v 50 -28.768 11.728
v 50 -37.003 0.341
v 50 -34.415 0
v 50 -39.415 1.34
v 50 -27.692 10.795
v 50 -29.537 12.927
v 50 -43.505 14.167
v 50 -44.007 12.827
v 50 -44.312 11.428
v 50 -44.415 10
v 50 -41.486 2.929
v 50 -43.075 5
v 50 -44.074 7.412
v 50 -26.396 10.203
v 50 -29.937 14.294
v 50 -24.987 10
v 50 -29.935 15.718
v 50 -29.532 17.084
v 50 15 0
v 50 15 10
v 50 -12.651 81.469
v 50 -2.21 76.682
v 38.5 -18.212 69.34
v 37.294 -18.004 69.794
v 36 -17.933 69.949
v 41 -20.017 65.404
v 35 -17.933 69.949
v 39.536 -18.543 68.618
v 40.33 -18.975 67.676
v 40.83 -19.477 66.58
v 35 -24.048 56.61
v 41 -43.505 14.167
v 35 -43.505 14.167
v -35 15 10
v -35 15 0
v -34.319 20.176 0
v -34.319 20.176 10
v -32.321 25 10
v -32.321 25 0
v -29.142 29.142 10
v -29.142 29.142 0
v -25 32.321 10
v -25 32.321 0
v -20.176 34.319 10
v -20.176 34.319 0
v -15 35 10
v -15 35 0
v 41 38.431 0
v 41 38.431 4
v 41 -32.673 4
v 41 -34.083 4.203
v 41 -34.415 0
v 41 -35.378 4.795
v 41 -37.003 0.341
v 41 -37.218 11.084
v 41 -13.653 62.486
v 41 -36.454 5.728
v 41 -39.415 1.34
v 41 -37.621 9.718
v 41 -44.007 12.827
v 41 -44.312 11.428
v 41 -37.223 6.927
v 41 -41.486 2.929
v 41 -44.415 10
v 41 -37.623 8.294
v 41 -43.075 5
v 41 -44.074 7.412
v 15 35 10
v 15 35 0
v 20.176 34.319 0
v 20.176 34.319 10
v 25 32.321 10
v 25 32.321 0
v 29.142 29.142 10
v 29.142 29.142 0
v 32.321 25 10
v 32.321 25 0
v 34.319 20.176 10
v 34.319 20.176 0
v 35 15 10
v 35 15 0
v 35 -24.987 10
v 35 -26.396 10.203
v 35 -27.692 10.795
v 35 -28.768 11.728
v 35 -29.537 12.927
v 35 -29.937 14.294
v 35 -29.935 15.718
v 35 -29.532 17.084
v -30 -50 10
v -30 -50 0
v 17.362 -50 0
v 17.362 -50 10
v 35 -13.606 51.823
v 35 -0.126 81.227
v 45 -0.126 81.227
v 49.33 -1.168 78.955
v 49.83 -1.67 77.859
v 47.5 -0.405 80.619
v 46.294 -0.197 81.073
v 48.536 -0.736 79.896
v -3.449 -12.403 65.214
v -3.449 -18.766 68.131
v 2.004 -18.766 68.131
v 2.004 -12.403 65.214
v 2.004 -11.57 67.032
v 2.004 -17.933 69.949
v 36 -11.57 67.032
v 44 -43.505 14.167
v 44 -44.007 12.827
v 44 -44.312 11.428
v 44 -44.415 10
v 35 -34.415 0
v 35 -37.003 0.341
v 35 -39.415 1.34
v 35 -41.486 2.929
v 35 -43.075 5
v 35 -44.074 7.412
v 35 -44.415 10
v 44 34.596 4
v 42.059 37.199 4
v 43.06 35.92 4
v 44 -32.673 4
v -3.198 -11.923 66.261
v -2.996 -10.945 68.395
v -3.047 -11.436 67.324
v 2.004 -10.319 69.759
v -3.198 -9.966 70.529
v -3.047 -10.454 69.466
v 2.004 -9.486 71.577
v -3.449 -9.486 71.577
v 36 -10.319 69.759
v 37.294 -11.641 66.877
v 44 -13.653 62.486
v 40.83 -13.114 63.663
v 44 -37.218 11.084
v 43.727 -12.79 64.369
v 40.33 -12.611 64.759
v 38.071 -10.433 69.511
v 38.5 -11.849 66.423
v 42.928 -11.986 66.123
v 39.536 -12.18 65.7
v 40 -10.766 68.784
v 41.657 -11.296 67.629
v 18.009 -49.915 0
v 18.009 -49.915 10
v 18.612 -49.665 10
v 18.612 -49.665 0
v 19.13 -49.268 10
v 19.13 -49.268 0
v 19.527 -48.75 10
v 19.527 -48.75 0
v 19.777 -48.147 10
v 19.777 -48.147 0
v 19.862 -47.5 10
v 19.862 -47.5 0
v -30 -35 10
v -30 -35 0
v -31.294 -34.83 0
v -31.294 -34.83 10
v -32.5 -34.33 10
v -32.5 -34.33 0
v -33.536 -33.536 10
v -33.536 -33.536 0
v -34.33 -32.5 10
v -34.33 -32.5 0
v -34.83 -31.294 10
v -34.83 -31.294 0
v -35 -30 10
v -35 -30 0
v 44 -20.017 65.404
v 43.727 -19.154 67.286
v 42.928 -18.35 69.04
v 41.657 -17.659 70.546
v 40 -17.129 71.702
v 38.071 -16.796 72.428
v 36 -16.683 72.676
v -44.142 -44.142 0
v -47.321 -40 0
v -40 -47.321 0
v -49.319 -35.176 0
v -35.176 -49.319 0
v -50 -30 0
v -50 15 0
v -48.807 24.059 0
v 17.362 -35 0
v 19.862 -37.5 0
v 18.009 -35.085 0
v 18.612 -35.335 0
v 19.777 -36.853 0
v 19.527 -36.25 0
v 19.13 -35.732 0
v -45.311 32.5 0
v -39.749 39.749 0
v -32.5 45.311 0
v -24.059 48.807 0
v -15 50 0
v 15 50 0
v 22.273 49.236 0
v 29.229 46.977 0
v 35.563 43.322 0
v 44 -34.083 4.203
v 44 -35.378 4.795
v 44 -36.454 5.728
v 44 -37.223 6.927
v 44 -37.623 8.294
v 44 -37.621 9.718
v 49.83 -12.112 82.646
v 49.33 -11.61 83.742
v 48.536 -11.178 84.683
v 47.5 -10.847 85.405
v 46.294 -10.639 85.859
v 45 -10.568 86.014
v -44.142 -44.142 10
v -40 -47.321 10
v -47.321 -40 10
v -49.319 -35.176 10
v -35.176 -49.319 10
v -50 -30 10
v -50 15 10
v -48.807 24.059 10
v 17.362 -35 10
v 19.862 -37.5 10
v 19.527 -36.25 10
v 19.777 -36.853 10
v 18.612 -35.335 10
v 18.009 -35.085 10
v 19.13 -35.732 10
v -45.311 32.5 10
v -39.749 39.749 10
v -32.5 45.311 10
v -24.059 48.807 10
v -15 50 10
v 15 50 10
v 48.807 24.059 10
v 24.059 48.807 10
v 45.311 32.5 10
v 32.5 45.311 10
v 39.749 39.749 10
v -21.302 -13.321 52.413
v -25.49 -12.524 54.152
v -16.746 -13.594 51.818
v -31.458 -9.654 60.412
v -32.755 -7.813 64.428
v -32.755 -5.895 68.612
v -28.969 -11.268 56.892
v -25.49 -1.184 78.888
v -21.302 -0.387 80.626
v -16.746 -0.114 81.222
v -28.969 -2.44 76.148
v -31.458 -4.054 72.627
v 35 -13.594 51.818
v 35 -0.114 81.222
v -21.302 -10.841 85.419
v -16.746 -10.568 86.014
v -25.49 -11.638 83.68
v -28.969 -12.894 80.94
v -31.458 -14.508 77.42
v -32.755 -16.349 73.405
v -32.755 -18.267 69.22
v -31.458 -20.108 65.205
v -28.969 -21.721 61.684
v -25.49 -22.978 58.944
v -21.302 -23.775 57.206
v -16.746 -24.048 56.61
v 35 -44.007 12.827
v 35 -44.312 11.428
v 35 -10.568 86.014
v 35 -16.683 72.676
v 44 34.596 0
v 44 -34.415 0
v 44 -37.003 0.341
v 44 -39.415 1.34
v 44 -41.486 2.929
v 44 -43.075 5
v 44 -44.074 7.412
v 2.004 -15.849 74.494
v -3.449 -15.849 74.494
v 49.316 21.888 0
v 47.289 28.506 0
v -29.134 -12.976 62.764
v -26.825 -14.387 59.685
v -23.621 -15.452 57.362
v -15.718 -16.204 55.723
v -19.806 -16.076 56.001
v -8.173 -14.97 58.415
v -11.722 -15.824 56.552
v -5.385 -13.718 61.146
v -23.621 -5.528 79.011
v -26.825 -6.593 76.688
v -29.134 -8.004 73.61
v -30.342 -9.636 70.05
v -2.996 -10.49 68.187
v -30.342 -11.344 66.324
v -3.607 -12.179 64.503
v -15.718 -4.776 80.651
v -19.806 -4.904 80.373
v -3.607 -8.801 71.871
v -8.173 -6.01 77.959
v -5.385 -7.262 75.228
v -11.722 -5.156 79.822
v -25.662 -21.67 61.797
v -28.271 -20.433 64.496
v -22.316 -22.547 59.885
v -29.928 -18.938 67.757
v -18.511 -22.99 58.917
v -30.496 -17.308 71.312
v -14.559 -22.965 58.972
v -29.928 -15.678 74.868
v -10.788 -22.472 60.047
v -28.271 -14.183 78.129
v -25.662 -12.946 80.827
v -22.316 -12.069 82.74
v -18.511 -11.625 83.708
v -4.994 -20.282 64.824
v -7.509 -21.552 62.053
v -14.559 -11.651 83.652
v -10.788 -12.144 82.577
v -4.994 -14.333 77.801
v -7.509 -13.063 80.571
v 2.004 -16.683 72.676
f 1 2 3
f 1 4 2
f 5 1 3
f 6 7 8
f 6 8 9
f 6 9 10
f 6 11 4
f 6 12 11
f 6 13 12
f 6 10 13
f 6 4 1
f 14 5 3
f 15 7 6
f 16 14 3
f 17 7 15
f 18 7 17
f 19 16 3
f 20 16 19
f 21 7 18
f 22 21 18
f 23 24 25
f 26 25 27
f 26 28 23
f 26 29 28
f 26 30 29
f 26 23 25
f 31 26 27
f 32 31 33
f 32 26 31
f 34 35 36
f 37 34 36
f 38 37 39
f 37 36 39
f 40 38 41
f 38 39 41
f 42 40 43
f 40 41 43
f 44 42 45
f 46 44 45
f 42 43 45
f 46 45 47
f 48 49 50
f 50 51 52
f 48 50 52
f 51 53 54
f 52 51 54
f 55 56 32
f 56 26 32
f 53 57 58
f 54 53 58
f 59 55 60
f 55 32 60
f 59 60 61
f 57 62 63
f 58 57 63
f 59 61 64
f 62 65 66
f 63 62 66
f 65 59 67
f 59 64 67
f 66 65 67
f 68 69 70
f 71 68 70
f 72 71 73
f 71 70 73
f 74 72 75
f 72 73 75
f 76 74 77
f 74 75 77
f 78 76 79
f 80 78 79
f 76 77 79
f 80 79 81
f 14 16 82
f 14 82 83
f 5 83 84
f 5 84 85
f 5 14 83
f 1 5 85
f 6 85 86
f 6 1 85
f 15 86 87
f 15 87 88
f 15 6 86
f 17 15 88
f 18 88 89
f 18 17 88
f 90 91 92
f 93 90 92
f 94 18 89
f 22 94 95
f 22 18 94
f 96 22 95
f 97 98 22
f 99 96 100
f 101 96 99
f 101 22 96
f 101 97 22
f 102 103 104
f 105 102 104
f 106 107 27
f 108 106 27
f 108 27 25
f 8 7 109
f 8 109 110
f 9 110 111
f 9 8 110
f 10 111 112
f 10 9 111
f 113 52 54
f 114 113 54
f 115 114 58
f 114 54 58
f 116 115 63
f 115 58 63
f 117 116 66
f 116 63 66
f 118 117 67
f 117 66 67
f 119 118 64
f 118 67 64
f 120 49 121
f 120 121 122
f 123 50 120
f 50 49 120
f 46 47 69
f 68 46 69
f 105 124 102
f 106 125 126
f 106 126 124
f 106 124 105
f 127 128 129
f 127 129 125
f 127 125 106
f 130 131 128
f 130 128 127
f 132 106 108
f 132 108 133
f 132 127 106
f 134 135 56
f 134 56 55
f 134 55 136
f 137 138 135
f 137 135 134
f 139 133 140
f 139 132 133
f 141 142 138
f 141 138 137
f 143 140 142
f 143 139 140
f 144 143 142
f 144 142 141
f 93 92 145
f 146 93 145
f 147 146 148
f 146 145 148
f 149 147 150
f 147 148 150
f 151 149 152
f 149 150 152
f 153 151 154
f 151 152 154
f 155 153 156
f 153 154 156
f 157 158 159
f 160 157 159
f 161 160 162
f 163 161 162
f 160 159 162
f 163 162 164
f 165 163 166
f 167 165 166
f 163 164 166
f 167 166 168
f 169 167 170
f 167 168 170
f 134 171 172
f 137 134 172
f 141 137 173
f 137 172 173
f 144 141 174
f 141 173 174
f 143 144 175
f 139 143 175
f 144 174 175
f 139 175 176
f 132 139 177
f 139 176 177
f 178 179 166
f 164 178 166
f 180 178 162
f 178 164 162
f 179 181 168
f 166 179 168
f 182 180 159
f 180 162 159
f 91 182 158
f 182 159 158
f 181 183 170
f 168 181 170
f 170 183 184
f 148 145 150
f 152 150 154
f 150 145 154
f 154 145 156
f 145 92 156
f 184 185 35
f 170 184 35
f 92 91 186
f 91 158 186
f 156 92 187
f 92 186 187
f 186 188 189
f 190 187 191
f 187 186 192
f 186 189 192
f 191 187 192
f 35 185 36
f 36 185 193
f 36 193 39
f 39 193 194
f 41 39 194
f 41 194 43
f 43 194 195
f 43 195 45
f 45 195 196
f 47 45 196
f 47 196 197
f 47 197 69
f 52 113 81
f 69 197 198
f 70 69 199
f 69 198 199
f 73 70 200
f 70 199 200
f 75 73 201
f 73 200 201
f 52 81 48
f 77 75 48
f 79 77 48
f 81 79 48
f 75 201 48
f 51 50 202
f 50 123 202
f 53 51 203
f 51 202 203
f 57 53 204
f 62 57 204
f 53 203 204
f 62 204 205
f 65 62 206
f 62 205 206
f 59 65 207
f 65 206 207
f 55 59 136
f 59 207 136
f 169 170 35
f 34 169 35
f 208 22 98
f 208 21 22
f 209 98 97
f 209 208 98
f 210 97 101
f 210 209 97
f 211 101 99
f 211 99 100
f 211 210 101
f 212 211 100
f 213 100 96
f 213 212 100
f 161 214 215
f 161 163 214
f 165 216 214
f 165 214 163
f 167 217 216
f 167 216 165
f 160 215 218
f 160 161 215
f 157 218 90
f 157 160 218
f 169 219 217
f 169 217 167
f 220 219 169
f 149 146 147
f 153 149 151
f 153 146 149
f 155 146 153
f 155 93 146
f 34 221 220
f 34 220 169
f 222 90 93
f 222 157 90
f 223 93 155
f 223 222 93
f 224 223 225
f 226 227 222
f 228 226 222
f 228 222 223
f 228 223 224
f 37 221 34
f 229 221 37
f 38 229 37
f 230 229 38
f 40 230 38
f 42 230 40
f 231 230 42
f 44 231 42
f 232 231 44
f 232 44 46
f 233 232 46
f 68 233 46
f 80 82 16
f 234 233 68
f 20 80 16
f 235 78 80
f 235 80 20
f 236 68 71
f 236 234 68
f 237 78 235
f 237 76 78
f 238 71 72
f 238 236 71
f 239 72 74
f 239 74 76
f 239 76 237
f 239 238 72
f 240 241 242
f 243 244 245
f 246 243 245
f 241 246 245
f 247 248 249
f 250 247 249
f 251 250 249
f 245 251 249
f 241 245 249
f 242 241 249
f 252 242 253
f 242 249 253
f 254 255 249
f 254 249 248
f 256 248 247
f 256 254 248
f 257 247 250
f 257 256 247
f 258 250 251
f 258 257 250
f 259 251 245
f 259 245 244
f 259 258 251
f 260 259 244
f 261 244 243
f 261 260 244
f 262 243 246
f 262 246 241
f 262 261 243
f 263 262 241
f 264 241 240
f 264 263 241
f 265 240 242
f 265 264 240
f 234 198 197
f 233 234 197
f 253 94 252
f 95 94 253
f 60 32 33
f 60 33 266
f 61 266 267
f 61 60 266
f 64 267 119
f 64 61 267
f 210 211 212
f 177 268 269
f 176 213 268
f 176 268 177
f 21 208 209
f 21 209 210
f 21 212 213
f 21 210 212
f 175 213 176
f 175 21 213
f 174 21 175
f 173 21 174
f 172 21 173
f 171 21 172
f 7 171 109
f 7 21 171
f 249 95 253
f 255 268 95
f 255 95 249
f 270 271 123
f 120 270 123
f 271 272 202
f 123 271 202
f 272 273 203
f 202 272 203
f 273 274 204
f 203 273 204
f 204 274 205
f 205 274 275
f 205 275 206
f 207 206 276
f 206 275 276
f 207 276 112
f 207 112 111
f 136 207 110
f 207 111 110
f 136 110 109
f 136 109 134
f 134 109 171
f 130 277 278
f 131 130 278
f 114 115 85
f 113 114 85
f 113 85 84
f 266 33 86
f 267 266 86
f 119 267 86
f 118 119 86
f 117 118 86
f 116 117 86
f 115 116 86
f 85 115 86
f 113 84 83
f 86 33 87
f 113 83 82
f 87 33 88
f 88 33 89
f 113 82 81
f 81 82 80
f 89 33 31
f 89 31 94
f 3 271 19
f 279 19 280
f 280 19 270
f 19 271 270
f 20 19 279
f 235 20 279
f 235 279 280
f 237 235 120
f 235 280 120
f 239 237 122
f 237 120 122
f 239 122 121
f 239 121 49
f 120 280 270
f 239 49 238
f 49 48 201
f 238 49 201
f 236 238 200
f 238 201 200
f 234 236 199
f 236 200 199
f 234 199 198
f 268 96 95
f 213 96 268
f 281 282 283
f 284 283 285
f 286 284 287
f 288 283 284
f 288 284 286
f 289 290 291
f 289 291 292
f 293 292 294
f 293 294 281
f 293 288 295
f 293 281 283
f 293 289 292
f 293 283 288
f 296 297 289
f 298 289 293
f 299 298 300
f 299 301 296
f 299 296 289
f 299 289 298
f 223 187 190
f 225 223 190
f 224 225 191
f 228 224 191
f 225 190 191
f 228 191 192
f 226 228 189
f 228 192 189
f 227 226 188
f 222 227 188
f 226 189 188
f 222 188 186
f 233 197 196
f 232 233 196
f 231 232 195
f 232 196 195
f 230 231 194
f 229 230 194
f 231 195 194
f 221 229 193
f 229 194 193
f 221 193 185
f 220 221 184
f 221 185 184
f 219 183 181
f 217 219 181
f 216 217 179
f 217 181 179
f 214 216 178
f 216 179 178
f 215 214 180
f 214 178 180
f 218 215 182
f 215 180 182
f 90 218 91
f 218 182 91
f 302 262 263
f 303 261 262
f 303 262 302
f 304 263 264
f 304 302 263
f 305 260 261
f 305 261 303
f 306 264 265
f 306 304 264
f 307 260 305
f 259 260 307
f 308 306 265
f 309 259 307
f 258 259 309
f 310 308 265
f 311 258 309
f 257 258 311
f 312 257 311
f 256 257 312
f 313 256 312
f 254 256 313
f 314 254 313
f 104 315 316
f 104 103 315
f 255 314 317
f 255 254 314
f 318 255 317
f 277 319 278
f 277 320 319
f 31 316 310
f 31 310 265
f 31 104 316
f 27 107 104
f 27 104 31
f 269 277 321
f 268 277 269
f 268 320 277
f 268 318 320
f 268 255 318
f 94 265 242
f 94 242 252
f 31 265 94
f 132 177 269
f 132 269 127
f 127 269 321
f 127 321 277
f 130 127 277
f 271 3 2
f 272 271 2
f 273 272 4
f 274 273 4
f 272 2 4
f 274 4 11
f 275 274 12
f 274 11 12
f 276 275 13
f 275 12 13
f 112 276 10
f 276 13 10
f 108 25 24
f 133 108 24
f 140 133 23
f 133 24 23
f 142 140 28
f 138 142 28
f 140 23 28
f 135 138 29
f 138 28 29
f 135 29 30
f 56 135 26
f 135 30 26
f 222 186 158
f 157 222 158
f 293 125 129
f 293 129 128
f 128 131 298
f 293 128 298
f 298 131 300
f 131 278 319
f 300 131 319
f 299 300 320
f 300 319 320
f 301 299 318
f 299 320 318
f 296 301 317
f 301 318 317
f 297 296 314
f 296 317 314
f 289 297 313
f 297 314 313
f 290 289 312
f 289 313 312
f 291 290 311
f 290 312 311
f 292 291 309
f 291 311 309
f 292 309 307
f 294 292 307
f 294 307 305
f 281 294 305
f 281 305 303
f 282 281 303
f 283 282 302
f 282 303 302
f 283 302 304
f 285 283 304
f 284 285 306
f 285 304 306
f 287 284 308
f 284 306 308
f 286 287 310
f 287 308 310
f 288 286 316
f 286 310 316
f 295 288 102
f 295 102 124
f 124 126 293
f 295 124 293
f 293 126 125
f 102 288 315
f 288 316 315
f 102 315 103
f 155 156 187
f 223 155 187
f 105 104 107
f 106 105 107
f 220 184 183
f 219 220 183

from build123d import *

# Parameters (mm, degrees)
F1_DEPTH  = 10
F3_DEPTH  = 25.0000003725
F4_DEPTH  = 15
F5_R      = 13.75
F6_DEPTH  = 11.5
F7_DEPTH  = 7.5
F8_W      = 3
F8_H      = 12.169879545
F9_DEPTH  = 7
F10_W     = 3
F10_H     = 7.9815720619
F11_DEPTH = 4
F12_R     = 5
F13_R     = 5


# Not quite as in the source:
# - a feature names something its author has since deleted; it is built from what else it names


with BuildPart() as f1:
    # F0 (on Top) → F1 (new body)
    with BuildSketch(Plane.XY):
        with BuildLine():
            ThreePointArc((50, 15), (39.7487373415, 39.7487373415), (15, 50))
            Line((15, 50), (-15, 50))
            ThreePointArc((-15, 50), (-39.7487373415, 39.7487373415), (-50, 15))
            Line((-50, 15), (-50, -30))
            ThreePointArc((-50, -30), (-44.1421356237, -44.1421356237), (-30, -50))
            Line((-30, -50), (17.3621465266, -50))
            ThreePointArc((17.3621465266, -50), (19.1299134795, -49.267766953), (19.8621465266, -47.5))
            Line((19.8621465266, -47.5), (19.8621465266, -37.5))
            ThreePointArc((19.8621465266, -37.5), (19.1299134795, -35.732233047), (17.3621465266, -35))
            Line((17.3621465266, -35), (-30, -35))
            ThreePointArc((-30, -35), (-33.5355339059, -33.5355339059), (-35, -30))
            Line((-35, -30), (-35, 15))
            ThreePointArc((-35, 15), (-29.1421356237, 29.1421356237), (-15, 35))
            Line((-15, 35), (15, 35))
            ThreePointArc((15, 35), (29.1421356237, 29.1421356237), (35, 15))
            Line((35, 15), (35, -35))
            Line((35, -35), (35, -50))
            Line((35, -50), (50, -50))
            Line((50, -50), (50, 15))
        make_face()
    extrude(amount=F1_DEPTH)

    # F2 (on face) → F3 (cut)
    with BuildSketch(Plane.YZ.offset(50)):
        with BuildLine():
            ThreePointArc((-34.4148690401, 0), (-41.4859368519, 2.9289321881), (-44.4148690401, 10))
            Line((-44.4148690401, 10), (-50, 10))
            Line((-50, 10), (-50, 0))
            Line((-50, 0), (-34.4148690401, 0))
        make_face()
    extrude(amount=-F3_DEPTH, mode=Mode.SUBTRACT)

    # F2 (on face) → F4 (join)
    with BuildSketch(Plane.YZ.offset(50)):
        with BuildLine():
            Line((-10.5677563486, 86.0143546169), (-43.5051570601, 14.1673329256))
            ThreePointArc((-43.5051570601, 14.1673329256), (-44.1847943264, 12.1327353094), (-44.4148690401, 10))
            Line((-44.4148690401, 10), (-24.9867949218, 10))
            ThreePointArc((-24.9867949218, 10), (-29.1950209325, 12.299845589), (-29.5319389318, 17.0836664628))
            Line((-29.5319389318, 17.0836664628), (-0.1259929755, 81.2274541128))
            Line((-0.1259929755, 81.2274541128), (-10.5677563486, 86.0143546169))
        make_face()
    extrude(amount=-F4_DEPTH)

    # F5 (on face) → F6 (join)
    with BuildSketch(Plane(origin=(0, -41.3166681437, 18.9411282845), x_dir=(1, 0, 0), z_dir=(0, -0.909028802, 0.4167332926))):
        with BuildLine():
            ThreePointArc((-0.5725613731, 57.6122225326), (-5.3096309812, 69.0485202264), (-16.7459286749, 73.7855898345))
            ThreePointArc((-16.7459286749, 73.7855898345), (-32.9192959768, 57.6122225326), (-16.7459286749, 41.4388552308))
            ThreePointArc((-16.7459286749, 41.4388552308), (-5.3096309812, 46.1759248389), (-0.5725613731, 57.6122225326))
        make_face()
        with Locations((-16.7459286749, 57.6122225326)):
            Circle(F5_R, mode=Mode.SUBTRACT)
        with Locations((-16.7459286749, 57.6122225326)):
            Circle(F5_R)
        with BuildLine():
            Line((35, 41.4388552308), (35, 73.7855898345))
            Line((35, 73.7855898345), (-16.7459286749, 73.7855898345))
            ThreePointArc((-16.7459286749, 73.7855898345), (-5.3096309812, 69.0485202264), (-0.5725613731, 57.6122225326))
            ThreePointArc((-0.5725613731, 57.6122225326), (-5.3096309812, 46.1759248389), (-16.7459286749, 41.4388552308))
            Line((-16.7459286749, 41.4388552308), (35, 41.4388552308))
        make_face()
    extrude(amount=-F6_DEPTH)

    # F5 (on face) → F7 (cut)
    with BuildSketch(Plane(origin=(0, -41.3166681437, 18.9411282845), x_dir=(1, 0, 0), z_dir=(0, -0.909028802, 0.4167332926))):
        with Locations((-16.7459286749, 57.6122225326)):
            Circle(F5_R)
    extrude(amount=-F7_DEPTH, mode=Mode.SUBTRACT)

    # F8 (on face) → F9 (cut)
    with BuildSketch(Plane(origin=(0, -41.3166681437, 18.9411282845), x_dir=(1, 0, 0), z_dir=(0, -0.909028802, 0.4167332926))):
        with BuildLine():
            Line((2.0040713251, 56.1122225326), (2.0040713251, 59.1122225326))
            Line((2.0040713251, 59.1122225326), (2.0040713251, 61.1122225326))
            Line((2.0040713251, 61.1122225326), (-3.448842528, 61.1122225326))
            ThreePointArc((-3.448842528, 61.1122225326), (-3.109627224, 59.376813913), (-2.9959286749, 57.6122225326))
            ThreePointArc((-2.9959286749, 57.6122225326), (-3.109627224, 55.8476311523), (-3.448842528, 54.1122225326))
            Line((-3.448842528, 54.1122225326), (2.0040713251, 54.1122225326))
            Line((2.0040713251, 54.1122225326), (2.0040713251, 56.1122225326))
        make_face()
        with BuildLine():
            Line((36, 59.1122225326), (2.0040713251, 59.1122225326))
            Line((2.0040713251, 59.1122225326), (2.0040713251, 56.1122225326))
            Line((2.0040713251, 56.1122225326), (36, 56.1122225326))
            ThreePointArc((36, 56.1122225326), (39.5355339059, 54.6477564386), (41, 51.1122225326))
            Line((41, 51.1122225326), (41, -5.251533668))
            Line((41, -5.251533668), (44, -5.251533668))
            Line((44, -5.251533668), (44, 51.1122225326))
            ThreePointArc((44, 51.1122225326), (41.6568542495, 56.7690767821), (36, 59.1122225326))
        make_face()
        with Locations((42.5, -11.3364734405)):
            Rectangle(F8_W, F8_H)
    extrude(amount=-F9_DEPTH, mode=Mode.SUBTRACT)

    # F10 (on face) → F11 (cut)
    with BuildSketch(Plane(origin=(0, 0, 0), x_dir=(1, 0, 0), z_dir=(0, 0, -1))):
        with Locations((42.5, 38.4056550711)):
            Rectangle(F10_W, F10_H)
        with BuildLine():
            Line((44, 34.4148690401), (41, 34.4148690401))
            Line((41, 34.4148690401), (41, -38.4307490277))
            ThreePointArc((41, -38.4307490277), (42.5667640895, -36.5655632349), (44, -34.5959179423))
            Line((44, -34.5959179423), (44, 34.4148690401))
        make_face()
    extrude(amount=-F11_DEPTH, mode=Mode.SUBTRACT)

    # F12
    f12_edges = [f1.edges().sort_by_distance(p)[0] for p in [
        (42.5, -40.465722, 4),
    ]]
    fillet(f12_edges, radius=F12_R)

    # F13
    f13_edges = [f1.edges().sort_by_distance(p)[0] for p in [
        (50, -5.346875, 83.620904),
    ]]
    fillet(f13_edges, radius=F13_R)


solid = f1.part
